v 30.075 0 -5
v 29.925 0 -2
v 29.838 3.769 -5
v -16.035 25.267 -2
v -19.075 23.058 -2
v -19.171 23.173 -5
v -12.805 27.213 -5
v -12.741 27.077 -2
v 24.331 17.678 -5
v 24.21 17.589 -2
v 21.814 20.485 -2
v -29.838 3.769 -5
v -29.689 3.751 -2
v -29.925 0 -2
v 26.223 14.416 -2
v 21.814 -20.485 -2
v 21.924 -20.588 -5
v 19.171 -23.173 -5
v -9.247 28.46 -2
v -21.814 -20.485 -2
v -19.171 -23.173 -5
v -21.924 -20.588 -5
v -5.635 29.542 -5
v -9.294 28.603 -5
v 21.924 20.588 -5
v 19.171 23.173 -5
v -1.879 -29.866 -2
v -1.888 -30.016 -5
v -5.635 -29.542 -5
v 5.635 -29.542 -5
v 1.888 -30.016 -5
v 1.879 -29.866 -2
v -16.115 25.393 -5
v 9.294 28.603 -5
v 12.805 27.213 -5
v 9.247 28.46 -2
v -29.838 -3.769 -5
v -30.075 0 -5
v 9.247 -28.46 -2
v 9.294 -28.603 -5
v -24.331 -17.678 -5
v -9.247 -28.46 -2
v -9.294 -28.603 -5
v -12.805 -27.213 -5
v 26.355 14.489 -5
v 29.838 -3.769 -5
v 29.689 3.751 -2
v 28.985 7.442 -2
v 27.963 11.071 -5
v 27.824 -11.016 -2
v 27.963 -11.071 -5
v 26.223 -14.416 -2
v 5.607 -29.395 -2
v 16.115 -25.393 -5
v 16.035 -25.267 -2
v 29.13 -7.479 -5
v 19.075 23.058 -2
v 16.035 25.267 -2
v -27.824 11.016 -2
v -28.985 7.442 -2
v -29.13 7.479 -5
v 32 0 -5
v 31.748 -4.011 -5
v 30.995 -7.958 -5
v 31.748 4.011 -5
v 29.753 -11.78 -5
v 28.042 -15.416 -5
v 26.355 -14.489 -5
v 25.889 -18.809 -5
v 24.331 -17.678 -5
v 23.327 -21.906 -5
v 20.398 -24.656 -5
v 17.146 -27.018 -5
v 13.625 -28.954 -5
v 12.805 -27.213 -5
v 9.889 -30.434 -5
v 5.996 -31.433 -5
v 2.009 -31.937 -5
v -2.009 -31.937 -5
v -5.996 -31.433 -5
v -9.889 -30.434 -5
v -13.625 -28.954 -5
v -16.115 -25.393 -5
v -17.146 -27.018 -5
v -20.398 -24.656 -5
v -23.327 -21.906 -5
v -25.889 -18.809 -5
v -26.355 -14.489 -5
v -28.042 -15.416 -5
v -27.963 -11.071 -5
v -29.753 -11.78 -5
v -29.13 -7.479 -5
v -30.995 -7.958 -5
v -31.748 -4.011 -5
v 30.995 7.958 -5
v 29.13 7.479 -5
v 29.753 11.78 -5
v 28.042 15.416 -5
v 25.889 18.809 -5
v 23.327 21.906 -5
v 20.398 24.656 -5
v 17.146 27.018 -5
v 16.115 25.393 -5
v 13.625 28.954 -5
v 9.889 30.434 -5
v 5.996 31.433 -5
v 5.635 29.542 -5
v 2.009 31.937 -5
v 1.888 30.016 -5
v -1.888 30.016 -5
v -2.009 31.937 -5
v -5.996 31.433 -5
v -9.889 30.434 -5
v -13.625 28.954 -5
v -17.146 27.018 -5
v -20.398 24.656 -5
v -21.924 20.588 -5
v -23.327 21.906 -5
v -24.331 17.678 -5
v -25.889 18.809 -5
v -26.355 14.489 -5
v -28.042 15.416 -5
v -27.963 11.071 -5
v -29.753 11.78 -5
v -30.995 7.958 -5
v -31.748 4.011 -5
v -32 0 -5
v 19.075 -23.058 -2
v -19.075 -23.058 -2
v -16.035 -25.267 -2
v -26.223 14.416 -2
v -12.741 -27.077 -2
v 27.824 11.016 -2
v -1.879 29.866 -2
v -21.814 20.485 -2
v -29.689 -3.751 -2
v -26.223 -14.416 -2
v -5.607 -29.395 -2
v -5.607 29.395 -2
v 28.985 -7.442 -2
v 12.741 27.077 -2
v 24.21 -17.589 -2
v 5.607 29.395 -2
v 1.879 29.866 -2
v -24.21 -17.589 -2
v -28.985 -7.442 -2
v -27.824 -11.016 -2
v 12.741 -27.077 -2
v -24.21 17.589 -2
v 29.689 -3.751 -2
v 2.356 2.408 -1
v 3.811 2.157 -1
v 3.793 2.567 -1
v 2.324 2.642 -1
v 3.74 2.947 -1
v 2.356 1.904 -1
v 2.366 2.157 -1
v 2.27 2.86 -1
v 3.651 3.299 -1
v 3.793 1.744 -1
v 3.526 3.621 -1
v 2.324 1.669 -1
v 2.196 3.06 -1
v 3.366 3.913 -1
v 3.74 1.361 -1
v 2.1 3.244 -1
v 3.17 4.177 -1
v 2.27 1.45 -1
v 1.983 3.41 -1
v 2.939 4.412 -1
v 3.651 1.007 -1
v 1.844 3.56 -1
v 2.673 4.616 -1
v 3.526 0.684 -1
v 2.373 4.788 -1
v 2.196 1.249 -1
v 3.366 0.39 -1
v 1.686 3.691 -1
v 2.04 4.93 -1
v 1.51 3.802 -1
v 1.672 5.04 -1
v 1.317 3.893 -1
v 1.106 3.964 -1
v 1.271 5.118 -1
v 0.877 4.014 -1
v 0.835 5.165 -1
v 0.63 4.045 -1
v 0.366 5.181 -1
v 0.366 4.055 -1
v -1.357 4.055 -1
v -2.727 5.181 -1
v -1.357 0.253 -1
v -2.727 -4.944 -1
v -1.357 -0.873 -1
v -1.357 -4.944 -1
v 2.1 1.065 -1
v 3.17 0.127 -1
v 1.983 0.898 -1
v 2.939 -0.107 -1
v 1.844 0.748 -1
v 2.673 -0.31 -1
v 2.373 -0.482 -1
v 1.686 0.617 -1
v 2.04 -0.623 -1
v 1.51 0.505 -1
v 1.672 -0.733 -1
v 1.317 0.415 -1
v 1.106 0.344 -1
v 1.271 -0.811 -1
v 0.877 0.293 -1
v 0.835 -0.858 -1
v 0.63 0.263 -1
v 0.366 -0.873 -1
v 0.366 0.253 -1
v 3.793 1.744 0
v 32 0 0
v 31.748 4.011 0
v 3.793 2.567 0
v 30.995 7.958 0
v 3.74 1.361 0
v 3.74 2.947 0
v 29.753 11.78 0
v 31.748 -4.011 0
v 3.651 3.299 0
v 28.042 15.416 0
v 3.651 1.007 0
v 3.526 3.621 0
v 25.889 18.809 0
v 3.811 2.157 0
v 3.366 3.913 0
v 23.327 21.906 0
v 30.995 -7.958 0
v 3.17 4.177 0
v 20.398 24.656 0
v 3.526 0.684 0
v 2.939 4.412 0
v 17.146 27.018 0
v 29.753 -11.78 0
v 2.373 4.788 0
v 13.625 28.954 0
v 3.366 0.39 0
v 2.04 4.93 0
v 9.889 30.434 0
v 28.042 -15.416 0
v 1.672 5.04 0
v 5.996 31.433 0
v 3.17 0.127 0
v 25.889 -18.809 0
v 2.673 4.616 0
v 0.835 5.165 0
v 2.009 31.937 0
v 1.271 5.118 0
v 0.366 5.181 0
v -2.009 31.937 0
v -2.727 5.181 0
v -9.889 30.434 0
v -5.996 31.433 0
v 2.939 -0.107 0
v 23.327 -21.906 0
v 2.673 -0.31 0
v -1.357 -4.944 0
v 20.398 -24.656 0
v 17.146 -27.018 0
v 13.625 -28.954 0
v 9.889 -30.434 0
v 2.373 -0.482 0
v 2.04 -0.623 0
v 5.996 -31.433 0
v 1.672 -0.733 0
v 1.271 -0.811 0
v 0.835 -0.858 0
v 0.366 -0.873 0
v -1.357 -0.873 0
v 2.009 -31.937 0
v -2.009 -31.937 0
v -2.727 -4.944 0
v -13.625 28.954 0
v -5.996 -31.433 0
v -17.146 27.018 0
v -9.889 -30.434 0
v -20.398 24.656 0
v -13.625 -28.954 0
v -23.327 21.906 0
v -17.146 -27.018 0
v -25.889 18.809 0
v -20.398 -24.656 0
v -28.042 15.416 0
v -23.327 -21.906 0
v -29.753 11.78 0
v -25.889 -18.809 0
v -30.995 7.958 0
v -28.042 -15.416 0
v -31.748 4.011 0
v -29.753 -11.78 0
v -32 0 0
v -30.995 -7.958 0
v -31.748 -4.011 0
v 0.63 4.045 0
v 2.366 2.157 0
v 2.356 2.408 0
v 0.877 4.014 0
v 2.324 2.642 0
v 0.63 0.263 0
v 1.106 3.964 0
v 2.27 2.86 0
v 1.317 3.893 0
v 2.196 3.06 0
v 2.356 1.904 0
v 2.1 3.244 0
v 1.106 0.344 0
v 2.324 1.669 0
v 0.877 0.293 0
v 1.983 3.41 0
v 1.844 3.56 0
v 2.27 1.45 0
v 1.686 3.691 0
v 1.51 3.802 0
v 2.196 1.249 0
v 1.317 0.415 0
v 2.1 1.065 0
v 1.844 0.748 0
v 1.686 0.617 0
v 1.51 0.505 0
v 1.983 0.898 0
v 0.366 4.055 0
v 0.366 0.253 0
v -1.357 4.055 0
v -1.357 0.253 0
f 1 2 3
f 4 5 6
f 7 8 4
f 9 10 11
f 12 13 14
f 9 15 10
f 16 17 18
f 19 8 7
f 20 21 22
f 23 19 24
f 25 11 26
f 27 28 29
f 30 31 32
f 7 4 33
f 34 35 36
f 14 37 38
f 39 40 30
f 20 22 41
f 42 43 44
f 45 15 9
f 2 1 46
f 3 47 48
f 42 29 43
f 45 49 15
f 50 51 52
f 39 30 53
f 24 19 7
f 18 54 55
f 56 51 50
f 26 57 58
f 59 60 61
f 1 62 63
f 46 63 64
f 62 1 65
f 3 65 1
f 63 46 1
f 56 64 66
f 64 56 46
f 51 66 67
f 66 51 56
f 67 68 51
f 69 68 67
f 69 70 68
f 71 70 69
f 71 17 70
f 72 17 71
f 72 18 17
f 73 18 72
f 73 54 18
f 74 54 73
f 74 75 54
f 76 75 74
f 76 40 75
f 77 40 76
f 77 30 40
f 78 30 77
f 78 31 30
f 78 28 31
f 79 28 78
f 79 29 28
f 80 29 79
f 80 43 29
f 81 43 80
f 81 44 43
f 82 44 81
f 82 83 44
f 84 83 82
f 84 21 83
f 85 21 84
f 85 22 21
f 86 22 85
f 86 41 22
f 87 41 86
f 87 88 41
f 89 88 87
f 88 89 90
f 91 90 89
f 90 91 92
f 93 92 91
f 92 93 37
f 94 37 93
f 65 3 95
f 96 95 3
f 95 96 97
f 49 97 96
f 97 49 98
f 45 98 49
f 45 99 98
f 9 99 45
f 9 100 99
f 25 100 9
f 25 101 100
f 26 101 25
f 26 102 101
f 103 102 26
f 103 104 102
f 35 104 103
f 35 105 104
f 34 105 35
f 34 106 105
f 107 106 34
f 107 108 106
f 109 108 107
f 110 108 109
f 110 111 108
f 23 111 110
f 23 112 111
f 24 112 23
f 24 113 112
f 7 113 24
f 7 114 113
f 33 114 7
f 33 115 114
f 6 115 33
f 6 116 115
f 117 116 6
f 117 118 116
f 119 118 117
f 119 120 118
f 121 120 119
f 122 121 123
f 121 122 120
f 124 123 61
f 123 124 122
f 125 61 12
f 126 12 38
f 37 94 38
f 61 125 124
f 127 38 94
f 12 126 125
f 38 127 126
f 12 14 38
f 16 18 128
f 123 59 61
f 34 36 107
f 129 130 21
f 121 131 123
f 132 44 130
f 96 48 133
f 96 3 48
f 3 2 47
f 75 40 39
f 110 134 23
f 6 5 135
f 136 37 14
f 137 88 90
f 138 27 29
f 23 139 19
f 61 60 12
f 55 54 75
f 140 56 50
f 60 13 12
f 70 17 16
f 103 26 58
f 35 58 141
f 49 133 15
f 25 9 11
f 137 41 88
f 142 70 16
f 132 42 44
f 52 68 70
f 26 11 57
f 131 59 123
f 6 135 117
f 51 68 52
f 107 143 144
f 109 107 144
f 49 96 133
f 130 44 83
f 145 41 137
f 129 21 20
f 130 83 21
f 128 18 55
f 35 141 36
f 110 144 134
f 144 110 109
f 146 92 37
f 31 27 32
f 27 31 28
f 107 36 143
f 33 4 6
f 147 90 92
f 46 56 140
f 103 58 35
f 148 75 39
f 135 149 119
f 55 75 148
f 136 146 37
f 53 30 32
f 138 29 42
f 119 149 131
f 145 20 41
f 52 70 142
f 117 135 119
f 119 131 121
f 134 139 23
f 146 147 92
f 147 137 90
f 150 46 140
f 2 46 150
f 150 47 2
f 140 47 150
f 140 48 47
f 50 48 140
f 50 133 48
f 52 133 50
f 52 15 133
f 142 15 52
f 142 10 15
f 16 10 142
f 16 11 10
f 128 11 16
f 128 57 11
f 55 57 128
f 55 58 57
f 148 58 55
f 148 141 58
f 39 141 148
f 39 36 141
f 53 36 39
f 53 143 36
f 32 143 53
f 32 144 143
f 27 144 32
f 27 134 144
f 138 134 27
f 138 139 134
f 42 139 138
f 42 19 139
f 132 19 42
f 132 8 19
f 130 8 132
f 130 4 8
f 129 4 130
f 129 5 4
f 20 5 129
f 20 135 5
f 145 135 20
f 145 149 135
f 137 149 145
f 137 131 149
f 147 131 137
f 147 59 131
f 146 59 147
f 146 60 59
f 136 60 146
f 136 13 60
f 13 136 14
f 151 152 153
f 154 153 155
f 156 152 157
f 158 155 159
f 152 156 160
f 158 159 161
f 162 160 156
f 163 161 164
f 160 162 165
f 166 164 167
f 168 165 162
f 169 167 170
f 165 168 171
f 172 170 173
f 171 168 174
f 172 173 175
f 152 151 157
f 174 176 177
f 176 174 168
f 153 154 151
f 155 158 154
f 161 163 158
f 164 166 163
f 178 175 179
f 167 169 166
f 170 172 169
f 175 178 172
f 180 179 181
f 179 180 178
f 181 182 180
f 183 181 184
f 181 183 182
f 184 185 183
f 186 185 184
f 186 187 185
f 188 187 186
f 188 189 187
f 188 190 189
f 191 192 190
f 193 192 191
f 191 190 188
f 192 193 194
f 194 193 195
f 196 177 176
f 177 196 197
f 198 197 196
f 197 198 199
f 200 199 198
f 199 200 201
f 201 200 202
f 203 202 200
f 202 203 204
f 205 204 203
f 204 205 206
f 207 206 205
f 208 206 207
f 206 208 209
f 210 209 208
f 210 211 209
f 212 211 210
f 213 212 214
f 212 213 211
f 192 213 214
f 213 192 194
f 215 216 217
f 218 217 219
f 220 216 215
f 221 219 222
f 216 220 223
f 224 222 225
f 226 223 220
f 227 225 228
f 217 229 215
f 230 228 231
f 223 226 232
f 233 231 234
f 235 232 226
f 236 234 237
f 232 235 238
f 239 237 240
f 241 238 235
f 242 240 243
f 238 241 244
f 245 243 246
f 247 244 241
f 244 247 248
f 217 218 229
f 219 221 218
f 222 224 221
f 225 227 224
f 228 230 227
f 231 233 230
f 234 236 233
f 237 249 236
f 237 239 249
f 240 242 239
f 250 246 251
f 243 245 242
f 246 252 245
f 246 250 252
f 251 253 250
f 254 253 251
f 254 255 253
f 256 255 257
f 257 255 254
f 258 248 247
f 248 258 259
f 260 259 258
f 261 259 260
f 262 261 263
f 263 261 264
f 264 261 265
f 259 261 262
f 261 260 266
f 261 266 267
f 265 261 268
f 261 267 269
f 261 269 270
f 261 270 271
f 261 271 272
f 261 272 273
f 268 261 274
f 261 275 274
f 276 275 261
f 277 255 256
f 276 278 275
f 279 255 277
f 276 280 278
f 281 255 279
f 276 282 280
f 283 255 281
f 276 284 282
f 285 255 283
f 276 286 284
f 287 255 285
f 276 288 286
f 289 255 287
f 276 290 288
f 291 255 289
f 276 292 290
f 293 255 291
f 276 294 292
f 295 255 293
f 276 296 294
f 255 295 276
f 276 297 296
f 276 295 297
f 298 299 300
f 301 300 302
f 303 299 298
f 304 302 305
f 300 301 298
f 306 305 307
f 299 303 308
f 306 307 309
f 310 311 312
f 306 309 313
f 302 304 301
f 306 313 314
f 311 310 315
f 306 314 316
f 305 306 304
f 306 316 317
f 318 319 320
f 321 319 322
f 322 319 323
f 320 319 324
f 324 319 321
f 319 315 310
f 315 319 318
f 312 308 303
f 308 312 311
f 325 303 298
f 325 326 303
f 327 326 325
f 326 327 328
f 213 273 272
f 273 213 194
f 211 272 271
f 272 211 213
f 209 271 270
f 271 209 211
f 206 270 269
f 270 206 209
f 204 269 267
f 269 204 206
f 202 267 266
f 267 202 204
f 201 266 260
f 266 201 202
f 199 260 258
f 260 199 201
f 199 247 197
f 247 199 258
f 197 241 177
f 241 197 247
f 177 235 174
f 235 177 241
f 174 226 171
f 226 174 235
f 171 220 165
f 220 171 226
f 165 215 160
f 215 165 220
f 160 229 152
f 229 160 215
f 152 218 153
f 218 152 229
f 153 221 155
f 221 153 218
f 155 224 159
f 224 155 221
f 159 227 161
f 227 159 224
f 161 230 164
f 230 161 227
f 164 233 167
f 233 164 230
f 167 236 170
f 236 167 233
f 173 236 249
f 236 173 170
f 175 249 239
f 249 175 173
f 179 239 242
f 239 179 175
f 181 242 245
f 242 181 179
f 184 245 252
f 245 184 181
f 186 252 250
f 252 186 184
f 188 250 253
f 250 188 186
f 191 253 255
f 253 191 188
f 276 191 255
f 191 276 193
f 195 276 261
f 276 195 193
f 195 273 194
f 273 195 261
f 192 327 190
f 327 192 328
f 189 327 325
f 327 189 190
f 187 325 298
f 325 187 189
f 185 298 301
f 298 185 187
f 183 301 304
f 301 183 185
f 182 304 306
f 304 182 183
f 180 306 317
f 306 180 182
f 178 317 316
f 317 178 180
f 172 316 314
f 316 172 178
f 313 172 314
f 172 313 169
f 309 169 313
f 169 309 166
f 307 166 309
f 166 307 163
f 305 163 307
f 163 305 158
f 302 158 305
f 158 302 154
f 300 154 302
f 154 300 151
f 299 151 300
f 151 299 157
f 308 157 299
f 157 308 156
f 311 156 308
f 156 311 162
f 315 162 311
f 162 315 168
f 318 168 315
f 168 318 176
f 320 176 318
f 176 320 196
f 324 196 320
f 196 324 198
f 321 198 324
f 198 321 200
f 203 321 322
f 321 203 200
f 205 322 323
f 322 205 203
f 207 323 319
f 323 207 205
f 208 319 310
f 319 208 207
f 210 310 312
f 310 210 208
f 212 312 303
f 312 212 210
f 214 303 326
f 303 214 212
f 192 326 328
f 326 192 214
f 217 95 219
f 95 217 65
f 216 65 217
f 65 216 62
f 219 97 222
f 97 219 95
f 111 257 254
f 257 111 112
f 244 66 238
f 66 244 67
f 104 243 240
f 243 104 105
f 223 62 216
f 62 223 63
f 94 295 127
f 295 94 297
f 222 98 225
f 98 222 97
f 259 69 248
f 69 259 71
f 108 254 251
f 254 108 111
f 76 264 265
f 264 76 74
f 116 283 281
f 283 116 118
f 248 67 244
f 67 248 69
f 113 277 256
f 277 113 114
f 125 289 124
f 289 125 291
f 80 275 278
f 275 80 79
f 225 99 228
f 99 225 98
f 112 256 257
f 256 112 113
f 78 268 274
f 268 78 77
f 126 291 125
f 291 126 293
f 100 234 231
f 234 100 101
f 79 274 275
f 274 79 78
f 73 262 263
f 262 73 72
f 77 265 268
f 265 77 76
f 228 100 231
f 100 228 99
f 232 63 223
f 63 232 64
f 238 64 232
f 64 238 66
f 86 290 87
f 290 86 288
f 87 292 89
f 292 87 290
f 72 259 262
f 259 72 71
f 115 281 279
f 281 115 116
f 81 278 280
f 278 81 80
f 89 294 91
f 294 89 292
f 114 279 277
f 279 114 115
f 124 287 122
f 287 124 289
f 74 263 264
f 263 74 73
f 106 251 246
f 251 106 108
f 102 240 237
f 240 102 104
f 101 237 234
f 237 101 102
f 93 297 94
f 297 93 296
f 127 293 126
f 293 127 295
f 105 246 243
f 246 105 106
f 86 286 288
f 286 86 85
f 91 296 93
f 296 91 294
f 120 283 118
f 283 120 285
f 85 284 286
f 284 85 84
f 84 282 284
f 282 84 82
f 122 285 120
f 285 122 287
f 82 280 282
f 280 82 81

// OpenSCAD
$fn = 50;

difference() {
	union() {
		translate(v = [0, 0, -5.0]) {
			cylinder(h = 5, r = 32.0);
		}
	}
	union() {
		#translate(v = [0, 0, -5.0]) {
			cylinder(h = 3, r1 = 30.075, r2 = 29.925);
		}
		translate(v = [0, 0, -1]) {
			linear_extrude(height = 1) {
				text(font = "Impact", halign = "center", size = 10, text = "P", valign = "center");
			}
		}
	}
}
